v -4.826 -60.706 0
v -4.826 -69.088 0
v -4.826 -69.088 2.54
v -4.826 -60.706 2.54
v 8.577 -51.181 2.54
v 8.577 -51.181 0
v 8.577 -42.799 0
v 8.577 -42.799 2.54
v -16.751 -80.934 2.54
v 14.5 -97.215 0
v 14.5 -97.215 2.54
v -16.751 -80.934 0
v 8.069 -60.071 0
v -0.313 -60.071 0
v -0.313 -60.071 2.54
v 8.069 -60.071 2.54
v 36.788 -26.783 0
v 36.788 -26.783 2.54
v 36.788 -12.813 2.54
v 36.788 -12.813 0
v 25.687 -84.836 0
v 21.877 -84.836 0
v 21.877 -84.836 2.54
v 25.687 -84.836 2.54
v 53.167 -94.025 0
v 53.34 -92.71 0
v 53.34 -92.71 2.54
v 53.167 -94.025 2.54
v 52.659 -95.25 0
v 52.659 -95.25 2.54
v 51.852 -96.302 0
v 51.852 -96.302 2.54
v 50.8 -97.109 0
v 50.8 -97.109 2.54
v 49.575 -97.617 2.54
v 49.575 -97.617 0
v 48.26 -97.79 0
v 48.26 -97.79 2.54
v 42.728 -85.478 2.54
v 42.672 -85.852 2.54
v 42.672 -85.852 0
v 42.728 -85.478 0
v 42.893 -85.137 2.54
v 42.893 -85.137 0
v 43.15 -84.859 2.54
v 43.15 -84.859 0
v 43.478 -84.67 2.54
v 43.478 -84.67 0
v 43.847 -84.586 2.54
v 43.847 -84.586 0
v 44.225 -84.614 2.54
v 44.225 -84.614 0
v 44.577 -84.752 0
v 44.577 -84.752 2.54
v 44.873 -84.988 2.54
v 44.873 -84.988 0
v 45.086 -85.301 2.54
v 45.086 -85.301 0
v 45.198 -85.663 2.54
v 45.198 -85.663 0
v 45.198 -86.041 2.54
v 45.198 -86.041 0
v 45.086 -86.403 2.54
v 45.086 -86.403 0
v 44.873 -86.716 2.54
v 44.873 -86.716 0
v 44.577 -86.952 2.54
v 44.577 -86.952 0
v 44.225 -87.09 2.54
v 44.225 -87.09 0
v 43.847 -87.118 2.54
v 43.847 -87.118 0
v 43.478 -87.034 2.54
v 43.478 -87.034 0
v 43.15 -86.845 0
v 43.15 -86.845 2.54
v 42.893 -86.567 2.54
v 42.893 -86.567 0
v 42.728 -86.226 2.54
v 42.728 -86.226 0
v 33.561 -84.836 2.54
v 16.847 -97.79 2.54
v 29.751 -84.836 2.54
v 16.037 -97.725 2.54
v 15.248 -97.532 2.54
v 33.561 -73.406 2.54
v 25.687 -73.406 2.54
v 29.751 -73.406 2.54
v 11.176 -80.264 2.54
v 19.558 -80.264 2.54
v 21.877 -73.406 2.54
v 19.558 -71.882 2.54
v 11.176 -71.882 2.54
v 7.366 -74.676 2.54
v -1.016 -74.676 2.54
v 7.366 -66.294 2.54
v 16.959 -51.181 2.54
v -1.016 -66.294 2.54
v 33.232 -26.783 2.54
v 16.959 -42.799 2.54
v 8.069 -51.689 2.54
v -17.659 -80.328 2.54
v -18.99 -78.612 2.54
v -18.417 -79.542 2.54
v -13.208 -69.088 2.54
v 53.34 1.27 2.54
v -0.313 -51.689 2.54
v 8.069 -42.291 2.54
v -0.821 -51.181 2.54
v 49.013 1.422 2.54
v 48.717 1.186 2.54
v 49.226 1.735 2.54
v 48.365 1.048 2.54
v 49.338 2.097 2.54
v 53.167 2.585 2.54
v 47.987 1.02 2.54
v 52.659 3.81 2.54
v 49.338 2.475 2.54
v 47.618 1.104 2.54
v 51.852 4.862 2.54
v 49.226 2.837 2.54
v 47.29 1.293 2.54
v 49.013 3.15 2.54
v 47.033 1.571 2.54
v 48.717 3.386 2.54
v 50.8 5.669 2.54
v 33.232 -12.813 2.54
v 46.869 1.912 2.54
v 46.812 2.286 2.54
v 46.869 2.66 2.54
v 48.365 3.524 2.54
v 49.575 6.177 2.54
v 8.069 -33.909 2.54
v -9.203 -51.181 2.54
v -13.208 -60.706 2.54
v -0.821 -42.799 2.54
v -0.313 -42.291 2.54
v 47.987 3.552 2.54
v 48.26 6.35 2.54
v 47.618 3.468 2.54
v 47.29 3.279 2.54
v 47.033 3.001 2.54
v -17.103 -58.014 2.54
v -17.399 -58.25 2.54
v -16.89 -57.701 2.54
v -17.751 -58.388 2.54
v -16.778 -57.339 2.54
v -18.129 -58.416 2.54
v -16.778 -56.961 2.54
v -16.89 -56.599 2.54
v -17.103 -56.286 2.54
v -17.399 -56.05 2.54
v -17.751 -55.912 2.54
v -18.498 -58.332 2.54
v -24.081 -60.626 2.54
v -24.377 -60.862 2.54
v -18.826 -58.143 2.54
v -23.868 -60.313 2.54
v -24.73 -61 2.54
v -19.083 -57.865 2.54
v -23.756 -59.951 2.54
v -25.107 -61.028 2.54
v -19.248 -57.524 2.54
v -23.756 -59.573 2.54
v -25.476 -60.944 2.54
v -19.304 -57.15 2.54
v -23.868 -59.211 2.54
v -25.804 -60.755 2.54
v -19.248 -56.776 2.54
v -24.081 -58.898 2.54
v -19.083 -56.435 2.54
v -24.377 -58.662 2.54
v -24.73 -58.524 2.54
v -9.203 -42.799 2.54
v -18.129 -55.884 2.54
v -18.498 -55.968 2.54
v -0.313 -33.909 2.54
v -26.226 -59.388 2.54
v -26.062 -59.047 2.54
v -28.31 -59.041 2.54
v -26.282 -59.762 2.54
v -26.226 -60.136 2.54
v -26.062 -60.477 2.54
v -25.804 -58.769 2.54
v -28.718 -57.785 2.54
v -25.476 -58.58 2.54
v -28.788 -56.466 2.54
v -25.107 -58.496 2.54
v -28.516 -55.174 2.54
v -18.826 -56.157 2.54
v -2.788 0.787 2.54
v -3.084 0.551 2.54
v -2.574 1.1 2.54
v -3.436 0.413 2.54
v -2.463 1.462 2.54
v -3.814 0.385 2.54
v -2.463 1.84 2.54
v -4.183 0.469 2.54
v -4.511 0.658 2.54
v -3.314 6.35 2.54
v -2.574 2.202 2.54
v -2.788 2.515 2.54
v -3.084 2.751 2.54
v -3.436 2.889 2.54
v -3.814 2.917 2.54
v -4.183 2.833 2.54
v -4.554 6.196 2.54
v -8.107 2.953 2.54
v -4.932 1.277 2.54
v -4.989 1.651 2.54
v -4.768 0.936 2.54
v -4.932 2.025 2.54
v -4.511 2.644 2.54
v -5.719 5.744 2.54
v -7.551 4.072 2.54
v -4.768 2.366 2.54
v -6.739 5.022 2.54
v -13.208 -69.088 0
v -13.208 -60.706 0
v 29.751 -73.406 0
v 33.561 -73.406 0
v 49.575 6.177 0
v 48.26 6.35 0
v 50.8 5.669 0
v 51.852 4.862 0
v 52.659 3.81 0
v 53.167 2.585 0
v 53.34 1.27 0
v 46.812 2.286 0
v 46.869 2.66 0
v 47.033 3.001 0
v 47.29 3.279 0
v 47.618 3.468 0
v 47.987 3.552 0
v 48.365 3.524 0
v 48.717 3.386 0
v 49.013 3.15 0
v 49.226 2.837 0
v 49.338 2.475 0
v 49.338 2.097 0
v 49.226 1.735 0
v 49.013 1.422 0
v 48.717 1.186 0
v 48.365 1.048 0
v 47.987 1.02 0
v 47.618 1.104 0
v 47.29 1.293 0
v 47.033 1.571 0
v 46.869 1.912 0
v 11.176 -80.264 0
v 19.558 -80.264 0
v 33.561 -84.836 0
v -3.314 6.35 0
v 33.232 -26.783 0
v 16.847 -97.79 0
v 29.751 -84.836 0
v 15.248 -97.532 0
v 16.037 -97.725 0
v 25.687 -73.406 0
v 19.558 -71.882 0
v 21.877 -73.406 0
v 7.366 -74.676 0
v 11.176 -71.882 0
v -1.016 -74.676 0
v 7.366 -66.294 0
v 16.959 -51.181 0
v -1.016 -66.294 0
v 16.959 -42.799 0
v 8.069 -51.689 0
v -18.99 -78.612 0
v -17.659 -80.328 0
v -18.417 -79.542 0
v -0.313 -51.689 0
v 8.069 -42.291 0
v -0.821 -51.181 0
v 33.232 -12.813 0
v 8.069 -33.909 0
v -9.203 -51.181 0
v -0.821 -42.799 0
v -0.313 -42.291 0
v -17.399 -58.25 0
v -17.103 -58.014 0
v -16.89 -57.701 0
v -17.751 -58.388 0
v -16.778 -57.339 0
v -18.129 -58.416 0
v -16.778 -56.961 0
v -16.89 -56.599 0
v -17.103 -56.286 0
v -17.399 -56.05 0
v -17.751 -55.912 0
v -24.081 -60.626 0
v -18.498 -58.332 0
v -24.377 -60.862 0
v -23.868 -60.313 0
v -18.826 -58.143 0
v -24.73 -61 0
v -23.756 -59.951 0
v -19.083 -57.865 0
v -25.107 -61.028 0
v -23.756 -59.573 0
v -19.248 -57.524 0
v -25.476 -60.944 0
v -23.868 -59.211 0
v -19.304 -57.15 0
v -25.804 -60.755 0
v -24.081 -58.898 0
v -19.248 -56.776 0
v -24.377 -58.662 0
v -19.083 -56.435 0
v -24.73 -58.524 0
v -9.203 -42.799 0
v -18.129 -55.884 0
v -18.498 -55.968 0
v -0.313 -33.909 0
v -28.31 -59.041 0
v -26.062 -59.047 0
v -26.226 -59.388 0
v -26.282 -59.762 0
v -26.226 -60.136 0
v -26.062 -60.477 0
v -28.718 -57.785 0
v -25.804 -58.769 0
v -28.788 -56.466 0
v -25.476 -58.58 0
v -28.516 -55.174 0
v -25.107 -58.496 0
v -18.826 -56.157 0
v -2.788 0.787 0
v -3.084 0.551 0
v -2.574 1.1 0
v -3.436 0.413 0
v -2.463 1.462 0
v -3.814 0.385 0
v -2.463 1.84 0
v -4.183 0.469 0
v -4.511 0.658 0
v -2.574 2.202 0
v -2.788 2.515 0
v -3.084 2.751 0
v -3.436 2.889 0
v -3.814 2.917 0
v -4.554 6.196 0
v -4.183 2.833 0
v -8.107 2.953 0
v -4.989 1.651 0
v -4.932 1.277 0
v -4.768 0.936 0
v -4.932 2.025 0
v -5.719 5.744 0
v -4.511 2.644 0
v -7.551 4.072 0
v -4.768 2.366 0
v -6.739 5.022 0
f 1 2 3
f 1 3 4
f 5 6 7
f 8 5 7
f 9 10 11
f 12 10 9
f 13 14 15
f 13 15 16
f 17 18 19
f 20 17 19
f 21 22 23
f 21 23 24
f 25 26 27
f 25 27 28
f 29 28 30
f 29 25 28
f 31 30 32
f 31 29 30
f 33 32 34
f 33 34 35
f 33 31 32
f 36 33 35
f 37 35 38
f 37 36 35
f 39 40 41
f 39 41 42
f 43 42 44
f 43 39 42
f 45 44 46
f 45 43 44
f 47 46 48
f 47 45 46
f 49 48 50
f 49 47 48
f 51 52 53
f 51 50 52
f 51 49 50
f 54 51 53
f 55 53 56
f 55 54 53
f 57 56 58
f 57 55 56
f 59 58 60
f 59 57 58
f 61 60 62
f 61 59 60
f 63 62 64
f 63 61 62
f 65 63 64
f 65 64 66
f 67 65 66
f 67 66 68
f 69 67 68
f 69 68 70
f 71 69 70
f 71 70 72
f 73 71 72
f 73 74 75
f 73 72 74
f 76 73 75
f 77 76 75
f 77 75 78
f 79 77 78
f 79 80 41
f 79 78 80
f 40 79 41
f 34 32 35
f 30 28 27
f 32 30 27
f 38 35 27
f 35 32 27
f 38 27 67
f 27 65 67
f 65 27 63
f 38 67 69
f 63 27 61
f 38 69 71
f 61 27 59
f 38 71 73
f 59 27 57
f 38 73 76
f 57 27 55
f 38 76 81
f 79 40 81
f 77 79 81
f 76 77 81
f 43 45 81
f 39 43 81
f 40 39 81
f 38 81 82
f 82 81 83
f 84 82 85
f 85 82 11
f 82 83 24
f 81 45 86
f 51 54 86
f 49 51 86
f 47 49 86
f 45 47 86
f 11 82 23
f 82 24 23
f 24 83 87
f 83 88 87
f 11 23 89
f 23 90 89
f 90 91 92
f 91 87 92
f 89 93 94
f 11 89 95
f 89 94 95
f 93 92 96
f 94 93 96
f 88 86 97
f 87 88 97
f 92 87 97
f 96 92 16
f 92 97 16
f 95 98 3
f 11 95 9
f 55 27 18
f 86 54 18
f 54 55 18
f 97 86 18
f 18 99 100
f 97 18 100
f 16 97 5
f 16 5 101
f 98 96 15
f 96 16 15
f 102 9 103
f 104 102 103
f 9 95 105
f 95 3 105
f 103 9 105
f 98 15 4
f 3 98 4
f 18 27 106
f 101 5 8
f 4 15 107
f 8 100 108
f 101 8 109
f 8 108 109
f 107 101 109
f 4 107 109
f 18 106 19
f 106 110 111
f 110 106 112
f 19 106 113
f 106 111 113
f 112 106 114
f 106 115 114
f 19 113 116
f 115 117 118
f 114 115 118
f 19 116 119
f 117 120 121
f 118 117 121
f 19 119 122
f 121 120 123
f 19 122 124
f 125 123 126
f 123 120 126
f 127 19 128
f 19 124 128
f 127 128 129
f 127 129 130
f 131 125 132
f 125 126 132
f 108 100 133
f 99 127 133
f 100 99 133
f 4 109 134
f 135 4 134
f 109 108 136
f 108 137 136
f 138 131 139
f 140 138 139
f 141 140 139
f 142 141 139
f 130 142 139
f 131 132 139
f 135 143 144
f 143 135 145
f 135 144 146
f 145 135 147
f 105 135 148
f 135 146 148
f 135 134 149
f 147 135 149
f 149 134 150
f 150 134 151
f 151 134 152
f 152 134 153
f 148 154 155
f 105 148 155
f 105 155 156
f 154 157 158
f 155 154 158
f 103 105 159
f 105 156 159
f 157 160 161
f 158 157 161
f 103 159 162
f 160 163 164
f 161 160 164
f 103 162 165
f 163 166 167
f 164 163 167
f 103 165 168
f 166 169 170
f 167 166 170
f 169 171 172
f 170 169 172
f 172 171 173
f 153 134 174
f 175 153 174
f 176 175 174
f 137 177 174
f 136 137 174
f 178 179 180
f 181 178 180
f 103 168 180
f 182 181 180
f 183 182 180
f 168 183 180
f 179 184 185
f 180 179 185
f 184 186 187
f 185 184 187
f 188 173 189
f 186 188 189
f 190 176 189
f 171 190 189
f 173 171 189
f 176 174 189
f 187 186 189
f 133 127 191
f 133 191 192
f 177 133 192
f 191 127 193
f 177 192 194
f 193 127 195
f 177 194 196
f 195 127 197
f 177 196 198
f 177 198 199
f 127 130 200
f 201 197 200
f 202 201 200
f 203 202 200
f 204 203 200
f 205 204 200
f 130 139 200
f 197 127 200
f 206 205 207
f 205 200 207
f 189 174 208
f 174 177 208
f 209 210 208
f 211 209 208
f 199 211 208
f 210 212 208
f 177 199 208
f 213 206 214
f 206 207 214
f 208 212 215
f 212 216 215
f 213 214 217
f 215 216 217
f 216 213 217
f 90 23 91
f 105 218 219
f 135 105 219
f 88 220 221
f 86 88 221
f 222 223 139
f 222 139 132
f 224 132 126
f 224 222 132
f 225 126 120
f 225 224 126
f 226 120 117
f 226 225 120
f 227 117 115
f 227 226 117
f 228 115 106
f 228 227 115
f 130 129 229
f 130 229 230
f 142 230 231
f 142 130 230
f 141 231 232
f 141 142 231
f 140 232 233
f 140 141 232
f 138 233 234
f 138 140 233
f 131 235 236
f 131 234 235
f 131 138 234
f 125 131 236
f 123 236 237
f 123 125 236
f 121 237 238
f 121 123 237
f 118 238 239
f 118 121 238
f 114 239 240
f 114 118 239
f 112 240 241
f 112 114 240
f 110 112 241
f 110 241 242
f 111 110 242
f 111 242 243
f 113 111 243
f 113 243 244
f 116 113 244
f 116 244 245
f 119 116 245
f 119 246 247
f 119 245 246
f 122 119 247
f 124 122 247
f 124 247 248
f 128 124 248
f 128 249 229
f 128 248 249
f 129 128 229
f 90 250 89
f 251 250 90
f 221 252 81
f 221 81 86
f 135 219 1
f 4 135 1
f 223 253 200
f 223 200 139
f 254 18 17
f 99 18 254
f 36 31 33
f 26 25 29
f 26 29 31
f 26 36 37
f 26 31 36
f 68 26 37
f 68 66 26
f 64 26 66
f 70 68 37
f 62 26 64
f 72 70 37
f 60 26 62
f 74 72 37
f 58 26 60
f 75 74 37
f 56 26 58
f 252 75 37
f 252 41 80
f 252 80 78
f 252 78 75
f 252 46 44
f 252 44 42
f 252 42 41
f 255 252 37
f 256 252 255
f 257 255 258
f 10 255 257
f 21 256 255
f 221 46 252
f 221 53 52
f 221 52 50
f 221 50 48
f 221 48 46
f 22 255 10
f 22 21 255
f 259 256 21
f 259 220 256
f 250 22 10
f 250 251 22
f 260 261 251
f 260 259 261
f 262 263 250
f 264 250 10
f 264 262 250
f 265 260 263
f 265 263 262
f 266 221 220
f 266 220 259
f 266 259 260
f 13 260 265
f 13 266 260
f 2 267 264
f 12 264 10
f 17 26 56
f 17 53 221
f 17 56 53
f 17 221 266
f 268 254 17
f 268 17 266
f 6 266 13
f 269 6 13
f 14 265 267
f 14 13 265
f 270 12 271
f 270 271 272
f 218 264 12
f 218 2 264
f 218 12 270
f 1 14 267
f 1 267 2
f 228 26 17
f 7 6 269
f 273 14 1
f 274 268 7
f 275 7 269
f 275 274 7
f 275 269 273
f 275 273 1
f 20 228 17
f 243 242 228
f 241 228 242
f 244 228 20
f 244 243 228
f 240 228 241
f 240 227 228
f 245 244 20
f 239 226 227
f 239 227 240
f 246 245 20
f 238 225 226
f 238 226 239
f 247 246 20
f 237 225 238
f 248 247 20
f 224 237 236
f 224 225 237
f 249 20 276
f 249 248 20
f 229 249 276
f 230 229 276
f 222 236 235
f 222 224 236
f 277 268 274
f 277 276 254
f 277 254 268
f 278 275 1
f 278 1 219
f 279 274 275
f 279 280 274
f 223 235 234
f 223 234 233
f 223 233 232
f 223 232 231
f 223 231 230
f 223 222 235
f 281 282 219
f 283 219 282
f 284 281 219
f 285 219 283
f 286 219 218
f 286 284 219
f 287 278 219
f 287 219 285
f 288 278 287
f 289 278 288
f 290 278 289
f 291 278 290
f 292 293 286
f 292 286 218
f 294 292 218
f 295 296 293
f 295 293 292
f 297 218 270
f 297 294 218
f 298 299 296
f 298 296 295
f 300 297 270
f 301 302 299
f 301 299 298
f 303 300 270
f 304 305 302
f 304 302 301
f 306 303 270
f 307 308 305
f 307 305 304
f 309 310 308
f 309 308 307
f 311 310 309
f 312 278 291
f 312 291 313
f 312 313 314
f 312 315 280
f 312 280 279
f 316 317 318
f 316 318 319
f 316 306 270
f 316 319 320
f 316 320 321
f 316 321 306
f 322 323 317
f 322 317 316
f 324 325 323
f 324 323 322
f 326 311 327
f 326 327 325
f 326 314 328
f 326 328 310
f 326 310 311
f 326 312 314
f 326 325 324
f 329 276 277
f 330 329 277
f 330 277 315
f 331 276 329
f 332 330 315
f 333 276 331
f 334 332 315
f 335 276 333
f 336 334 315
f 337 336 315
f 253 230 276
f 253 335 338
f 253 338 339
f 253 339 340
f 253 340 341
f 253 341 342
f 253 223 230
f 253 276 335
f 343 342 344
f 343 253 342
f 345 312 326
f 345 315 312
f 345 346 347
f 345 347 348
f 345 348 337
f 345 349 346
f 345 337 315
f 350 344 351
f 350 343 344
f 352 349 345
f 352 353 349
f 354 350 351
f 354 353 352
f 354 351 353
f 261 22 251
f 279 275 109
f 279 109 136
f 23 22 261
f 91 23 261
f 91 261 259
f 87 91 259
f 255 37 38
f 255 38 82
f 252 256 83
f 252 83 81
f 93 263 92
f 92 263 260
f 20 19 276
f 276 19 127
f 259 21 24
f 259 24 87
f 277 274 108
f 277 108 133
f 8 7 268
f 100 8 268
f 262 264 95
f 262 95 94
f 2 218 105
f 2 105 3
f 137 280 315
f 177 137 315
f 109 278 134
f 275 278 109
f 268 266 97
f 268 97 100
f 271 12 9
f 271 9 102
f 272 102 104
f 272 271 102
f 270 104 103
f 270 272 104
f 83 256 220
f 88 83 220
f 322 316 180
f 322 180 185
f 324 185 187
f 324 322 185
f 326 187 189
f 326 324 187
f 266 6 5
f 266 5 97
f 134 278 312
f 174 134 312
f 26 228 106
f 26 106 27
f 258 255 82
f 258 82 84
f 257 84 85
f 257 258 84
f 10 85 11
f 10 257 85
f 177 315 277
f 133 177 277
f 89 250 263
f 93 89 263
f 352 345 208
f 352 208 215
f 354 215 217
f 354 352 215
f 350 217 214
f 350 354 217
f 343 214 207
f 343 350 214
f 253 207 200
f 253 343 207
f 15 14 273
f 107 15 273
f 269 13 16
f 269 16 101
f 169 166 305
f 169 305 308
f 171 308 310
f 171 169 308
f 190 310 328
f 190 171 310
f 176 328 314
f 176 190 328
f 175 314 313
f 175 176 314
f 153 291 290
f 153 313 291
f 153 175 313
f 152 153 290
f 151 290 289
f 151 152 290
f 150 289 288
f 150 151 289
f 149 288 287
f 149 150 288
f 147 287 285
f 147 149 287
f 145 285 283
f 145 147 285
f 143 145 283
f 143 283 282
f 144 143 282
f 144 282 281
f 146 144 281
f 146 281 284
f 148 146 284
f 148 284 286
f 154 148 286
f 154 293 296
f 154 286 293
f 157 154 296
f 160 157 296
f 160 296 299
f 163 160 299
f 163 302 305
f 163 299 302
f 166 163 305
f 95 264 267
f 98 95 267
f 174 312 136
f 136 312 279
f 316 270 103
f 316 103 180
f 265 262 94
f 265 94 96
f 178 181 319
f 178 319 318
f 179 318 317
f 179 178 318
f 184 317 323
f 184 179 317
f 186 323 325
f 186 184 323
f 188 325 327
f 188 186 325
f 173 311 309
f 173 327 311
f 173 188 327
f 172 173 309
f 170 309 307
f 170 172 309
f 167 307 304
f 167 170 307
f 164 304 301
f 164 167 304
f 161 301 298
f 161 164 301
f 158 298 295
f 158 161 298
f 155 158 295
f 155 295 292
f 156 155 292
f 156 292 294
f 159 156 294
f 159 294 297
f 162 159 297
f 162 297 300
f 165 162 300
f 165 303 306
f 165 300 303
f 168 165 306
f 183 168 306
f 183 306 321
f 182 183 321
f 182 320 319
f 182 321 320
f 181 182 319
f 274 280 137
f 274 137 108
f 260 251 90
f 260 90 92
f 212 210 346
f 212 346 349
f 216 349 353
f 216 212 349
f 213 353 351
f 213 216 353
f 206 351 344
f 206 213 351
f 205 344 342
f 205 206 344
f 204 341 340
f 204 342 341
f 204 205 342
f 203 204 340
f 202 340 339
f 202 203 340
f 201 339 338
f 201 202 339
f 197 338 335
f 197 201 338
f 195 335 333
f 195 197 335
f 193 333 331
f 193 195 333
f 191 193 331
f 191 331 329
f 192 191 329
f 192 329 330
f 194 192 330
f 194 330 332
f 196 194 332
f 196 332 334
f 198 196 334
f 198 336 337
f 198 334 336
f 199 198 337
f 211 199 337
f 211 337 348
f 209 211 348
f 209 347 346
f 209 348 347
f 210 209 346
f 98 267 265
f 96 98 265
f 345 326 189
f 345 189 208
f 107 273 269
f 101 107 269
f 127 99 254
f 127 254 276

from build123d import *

# Parameters (mm, degrees)
BOSS_EXTRUDE1_DEPTH     = 2.54
CUT_EXTRUDE1_DEPTH      = 112.420336115
CUT_EXTRUDE1_DEPTH_BACK = 112.420336115
SKETCH11_W              = 3.81
SKETCH11_H              = 11.43
SKETCH11_W_2            = 8.382
SKETCH11_H_2            = 8.382
CUT_EXTRUDE2_DEPTH      = 112.420336115
CUT_EXTRUDE2_DEPTH_BACK = 112.420336115
SKETCH12_R              = 1.27
CUT_EXTRUDE3_DEPTH      = 112.420336115
CUT_EXTRUDE3_DEPTH_BACK = 112.420336115
SKETCH13_R              = 1.27
CUT_EXTRUDE4_DEPTH      = 112.420336115
CUT_EXTRUDE4_DEPTH_BACK = 112.420336115
SKETCH14_W              = 3.556
SKETCH14_H              = 13.97


with BuildPart() as part:
    # Sketch10 → Boss-Extrude1 (new body)
    with BuildSketch(Plane.XY):
        with BuildLine():
            Line((53.34, 1.27), (53.34, -92.71))
            ThreePointArc((53.34, -92.71), (51.852102448, -96.302102448), (48.26, -97.79))
            Line((48.26, -97.79), (16.846989059, -97.79))
            ThreePointArc((16.846989059, -97.79), (15.638688158, -97.644208035), (14.499741809, -97.215200367))
            Line((14.499741809, -97.215200367), (-16.7505185, -80.933552139))
            ThreePointArc((-16.7505185, -80.933552139), (-18.059258376, -79.955412607), (-18.989802686, -78.61241436))
            Line((-18.989802686, -78.61241436), (-28.309569459, -59.040904135))
            ThreePointArc((-28.309569459, -59.040904135), (-28.795802898, -57.127870198), (-28.51617555, -55.173917704))
            Line((-28.51617555, -55.173917704), (-8.107195629, 2.952923842))
            ThreePointArc((-8.107195629, 2.952923842), (-6.251501454, 5.414614163), (-3.314058103, 6.35))
            Line((-3.314058103, 6.35), (48.26, 6.35))
            ThreePointArc((48.26, 6.35), (51.852102448, 4.862102448), (53.34, 1.27))
        make_face()
    extrude(amount=BOSS_EXTRUDE1_DEPTH)

    # Sketch11 → Cut-Extrude1 (cut, two sides: drawn at the far end of the back side and taken through both)
    with BuildSketch(Plane.XY.offset(2.54).offset(-CUT_EXTRUDE1_DEPTH_BACK)):
        with Locations((31.65602, -79.121)):
            Rectangle(SKETCH11_W, SKETCH11_H)
        with Locations((23.78202, -79.121)):
            Rectangle(SKETCH11_W, SKETCH11_H)
        with Locations((3.878385852, -55.88)):
            Rectangle(SKETCH11_W_2, SKETCH11_H_2)
        with Locations((-5.011614148, -46.99)):
            Rectangle(SKETCH11_W_2, SKETCH11_H_2)
        with Locations((3.878385852, -38.1)):
            Rectangle(SKETCH11_W_2, SKETCH11_H_2)
        with Locations((12.768385852, -46.99)):
            Rectangle(SKETCH11_W_2, SKETCH11_H_2)
        with Locations((-9.017, -64.897)):
            Rectangle(SKETCH11_W_2, SKETCH11_H_2)
        with Locations((3.175, -70.485)):
            Rectangle(SKETCH11_W_2, SKETCH11_H_2)
        with Locations((15.367, -76.073)):
            Rectangle(SKETCH11_W_2, SKETCH11_H_2)
    extrude(amount=CUT_EXTRUDE1_DEPTH + CUT_EXTRUDE1_DEPTH_BACK, mode=Mode.SUBTRACT)

    # Sketch12 → Cut-Extrude2 (cut, two sides: drawn at the far end of the back side and taken through both)
    with BuildSketch(Plane(origin=(0, 0, 0), x_dir=(-1, 0, 0), z_dir=(0, 0, -1)).offset(-CUT_EXTRUDE2_DEPTH_BACK)):
        with Locations((18.034, -57.15)):
            Circle(SKETCH12_R)
        with Locations((-43.942, -85.852)):
            Circle(SKETCH12_R)
    extrude(amount=CUT_EXTRUDE2_DEPTH + CUT_EXTRUDE2_DEPTH_BACK, mode=Mode.SUBTRACT)

    # Sketch13 → Cut-Extrude3 (cut, two sides: drawn at the far end of the back side and taken through both)
    with BuildSketch(Plane(origin=(0, 0, 0), x_dir=(-1, 0, 0), z_dir=(0, 0, -1)).offset(-CUT_EXTRUDE3_DEPTH_BACK)):
        with Locations((25.012261453, -59.761967182)):
            Circle(SKETCH13_R)
        with Locations((-48.0822, 2.286)):
            Circle(SKETCH13_R)
        with Locations((3.718687848, 1.651)):
            Circle(SKETCH13_R)
    extrude(amount=CUT_EXTRUDE3_DEPTH + CUT_EXTRUDE3_DEPTH_BACK, mode=Mode.SUBTRACT)

    # Sketch14 → Cut-Extrude4 (cut, two sides: drawn at the far end of the back side and taken through both)
    with BuildSketch(Plane(origin=(0, 0, 0), x_dir=(-1, 0, 0), z_dir=(0, 0, -1)).offset(-CUT_EXTRUDE4_DEPTH_BACK)):
        with Locations((-35.010498686, -19.798068862)):
            Rectangle(SKETCH14_W, SKETCH14_H)
    extrude(amount=CUT_EXTRUDE4_DEPTH + CUT_EXTRUDE4_DEPTH_BACK, mode=Mode.SUBTRACT)


solid = part.part
